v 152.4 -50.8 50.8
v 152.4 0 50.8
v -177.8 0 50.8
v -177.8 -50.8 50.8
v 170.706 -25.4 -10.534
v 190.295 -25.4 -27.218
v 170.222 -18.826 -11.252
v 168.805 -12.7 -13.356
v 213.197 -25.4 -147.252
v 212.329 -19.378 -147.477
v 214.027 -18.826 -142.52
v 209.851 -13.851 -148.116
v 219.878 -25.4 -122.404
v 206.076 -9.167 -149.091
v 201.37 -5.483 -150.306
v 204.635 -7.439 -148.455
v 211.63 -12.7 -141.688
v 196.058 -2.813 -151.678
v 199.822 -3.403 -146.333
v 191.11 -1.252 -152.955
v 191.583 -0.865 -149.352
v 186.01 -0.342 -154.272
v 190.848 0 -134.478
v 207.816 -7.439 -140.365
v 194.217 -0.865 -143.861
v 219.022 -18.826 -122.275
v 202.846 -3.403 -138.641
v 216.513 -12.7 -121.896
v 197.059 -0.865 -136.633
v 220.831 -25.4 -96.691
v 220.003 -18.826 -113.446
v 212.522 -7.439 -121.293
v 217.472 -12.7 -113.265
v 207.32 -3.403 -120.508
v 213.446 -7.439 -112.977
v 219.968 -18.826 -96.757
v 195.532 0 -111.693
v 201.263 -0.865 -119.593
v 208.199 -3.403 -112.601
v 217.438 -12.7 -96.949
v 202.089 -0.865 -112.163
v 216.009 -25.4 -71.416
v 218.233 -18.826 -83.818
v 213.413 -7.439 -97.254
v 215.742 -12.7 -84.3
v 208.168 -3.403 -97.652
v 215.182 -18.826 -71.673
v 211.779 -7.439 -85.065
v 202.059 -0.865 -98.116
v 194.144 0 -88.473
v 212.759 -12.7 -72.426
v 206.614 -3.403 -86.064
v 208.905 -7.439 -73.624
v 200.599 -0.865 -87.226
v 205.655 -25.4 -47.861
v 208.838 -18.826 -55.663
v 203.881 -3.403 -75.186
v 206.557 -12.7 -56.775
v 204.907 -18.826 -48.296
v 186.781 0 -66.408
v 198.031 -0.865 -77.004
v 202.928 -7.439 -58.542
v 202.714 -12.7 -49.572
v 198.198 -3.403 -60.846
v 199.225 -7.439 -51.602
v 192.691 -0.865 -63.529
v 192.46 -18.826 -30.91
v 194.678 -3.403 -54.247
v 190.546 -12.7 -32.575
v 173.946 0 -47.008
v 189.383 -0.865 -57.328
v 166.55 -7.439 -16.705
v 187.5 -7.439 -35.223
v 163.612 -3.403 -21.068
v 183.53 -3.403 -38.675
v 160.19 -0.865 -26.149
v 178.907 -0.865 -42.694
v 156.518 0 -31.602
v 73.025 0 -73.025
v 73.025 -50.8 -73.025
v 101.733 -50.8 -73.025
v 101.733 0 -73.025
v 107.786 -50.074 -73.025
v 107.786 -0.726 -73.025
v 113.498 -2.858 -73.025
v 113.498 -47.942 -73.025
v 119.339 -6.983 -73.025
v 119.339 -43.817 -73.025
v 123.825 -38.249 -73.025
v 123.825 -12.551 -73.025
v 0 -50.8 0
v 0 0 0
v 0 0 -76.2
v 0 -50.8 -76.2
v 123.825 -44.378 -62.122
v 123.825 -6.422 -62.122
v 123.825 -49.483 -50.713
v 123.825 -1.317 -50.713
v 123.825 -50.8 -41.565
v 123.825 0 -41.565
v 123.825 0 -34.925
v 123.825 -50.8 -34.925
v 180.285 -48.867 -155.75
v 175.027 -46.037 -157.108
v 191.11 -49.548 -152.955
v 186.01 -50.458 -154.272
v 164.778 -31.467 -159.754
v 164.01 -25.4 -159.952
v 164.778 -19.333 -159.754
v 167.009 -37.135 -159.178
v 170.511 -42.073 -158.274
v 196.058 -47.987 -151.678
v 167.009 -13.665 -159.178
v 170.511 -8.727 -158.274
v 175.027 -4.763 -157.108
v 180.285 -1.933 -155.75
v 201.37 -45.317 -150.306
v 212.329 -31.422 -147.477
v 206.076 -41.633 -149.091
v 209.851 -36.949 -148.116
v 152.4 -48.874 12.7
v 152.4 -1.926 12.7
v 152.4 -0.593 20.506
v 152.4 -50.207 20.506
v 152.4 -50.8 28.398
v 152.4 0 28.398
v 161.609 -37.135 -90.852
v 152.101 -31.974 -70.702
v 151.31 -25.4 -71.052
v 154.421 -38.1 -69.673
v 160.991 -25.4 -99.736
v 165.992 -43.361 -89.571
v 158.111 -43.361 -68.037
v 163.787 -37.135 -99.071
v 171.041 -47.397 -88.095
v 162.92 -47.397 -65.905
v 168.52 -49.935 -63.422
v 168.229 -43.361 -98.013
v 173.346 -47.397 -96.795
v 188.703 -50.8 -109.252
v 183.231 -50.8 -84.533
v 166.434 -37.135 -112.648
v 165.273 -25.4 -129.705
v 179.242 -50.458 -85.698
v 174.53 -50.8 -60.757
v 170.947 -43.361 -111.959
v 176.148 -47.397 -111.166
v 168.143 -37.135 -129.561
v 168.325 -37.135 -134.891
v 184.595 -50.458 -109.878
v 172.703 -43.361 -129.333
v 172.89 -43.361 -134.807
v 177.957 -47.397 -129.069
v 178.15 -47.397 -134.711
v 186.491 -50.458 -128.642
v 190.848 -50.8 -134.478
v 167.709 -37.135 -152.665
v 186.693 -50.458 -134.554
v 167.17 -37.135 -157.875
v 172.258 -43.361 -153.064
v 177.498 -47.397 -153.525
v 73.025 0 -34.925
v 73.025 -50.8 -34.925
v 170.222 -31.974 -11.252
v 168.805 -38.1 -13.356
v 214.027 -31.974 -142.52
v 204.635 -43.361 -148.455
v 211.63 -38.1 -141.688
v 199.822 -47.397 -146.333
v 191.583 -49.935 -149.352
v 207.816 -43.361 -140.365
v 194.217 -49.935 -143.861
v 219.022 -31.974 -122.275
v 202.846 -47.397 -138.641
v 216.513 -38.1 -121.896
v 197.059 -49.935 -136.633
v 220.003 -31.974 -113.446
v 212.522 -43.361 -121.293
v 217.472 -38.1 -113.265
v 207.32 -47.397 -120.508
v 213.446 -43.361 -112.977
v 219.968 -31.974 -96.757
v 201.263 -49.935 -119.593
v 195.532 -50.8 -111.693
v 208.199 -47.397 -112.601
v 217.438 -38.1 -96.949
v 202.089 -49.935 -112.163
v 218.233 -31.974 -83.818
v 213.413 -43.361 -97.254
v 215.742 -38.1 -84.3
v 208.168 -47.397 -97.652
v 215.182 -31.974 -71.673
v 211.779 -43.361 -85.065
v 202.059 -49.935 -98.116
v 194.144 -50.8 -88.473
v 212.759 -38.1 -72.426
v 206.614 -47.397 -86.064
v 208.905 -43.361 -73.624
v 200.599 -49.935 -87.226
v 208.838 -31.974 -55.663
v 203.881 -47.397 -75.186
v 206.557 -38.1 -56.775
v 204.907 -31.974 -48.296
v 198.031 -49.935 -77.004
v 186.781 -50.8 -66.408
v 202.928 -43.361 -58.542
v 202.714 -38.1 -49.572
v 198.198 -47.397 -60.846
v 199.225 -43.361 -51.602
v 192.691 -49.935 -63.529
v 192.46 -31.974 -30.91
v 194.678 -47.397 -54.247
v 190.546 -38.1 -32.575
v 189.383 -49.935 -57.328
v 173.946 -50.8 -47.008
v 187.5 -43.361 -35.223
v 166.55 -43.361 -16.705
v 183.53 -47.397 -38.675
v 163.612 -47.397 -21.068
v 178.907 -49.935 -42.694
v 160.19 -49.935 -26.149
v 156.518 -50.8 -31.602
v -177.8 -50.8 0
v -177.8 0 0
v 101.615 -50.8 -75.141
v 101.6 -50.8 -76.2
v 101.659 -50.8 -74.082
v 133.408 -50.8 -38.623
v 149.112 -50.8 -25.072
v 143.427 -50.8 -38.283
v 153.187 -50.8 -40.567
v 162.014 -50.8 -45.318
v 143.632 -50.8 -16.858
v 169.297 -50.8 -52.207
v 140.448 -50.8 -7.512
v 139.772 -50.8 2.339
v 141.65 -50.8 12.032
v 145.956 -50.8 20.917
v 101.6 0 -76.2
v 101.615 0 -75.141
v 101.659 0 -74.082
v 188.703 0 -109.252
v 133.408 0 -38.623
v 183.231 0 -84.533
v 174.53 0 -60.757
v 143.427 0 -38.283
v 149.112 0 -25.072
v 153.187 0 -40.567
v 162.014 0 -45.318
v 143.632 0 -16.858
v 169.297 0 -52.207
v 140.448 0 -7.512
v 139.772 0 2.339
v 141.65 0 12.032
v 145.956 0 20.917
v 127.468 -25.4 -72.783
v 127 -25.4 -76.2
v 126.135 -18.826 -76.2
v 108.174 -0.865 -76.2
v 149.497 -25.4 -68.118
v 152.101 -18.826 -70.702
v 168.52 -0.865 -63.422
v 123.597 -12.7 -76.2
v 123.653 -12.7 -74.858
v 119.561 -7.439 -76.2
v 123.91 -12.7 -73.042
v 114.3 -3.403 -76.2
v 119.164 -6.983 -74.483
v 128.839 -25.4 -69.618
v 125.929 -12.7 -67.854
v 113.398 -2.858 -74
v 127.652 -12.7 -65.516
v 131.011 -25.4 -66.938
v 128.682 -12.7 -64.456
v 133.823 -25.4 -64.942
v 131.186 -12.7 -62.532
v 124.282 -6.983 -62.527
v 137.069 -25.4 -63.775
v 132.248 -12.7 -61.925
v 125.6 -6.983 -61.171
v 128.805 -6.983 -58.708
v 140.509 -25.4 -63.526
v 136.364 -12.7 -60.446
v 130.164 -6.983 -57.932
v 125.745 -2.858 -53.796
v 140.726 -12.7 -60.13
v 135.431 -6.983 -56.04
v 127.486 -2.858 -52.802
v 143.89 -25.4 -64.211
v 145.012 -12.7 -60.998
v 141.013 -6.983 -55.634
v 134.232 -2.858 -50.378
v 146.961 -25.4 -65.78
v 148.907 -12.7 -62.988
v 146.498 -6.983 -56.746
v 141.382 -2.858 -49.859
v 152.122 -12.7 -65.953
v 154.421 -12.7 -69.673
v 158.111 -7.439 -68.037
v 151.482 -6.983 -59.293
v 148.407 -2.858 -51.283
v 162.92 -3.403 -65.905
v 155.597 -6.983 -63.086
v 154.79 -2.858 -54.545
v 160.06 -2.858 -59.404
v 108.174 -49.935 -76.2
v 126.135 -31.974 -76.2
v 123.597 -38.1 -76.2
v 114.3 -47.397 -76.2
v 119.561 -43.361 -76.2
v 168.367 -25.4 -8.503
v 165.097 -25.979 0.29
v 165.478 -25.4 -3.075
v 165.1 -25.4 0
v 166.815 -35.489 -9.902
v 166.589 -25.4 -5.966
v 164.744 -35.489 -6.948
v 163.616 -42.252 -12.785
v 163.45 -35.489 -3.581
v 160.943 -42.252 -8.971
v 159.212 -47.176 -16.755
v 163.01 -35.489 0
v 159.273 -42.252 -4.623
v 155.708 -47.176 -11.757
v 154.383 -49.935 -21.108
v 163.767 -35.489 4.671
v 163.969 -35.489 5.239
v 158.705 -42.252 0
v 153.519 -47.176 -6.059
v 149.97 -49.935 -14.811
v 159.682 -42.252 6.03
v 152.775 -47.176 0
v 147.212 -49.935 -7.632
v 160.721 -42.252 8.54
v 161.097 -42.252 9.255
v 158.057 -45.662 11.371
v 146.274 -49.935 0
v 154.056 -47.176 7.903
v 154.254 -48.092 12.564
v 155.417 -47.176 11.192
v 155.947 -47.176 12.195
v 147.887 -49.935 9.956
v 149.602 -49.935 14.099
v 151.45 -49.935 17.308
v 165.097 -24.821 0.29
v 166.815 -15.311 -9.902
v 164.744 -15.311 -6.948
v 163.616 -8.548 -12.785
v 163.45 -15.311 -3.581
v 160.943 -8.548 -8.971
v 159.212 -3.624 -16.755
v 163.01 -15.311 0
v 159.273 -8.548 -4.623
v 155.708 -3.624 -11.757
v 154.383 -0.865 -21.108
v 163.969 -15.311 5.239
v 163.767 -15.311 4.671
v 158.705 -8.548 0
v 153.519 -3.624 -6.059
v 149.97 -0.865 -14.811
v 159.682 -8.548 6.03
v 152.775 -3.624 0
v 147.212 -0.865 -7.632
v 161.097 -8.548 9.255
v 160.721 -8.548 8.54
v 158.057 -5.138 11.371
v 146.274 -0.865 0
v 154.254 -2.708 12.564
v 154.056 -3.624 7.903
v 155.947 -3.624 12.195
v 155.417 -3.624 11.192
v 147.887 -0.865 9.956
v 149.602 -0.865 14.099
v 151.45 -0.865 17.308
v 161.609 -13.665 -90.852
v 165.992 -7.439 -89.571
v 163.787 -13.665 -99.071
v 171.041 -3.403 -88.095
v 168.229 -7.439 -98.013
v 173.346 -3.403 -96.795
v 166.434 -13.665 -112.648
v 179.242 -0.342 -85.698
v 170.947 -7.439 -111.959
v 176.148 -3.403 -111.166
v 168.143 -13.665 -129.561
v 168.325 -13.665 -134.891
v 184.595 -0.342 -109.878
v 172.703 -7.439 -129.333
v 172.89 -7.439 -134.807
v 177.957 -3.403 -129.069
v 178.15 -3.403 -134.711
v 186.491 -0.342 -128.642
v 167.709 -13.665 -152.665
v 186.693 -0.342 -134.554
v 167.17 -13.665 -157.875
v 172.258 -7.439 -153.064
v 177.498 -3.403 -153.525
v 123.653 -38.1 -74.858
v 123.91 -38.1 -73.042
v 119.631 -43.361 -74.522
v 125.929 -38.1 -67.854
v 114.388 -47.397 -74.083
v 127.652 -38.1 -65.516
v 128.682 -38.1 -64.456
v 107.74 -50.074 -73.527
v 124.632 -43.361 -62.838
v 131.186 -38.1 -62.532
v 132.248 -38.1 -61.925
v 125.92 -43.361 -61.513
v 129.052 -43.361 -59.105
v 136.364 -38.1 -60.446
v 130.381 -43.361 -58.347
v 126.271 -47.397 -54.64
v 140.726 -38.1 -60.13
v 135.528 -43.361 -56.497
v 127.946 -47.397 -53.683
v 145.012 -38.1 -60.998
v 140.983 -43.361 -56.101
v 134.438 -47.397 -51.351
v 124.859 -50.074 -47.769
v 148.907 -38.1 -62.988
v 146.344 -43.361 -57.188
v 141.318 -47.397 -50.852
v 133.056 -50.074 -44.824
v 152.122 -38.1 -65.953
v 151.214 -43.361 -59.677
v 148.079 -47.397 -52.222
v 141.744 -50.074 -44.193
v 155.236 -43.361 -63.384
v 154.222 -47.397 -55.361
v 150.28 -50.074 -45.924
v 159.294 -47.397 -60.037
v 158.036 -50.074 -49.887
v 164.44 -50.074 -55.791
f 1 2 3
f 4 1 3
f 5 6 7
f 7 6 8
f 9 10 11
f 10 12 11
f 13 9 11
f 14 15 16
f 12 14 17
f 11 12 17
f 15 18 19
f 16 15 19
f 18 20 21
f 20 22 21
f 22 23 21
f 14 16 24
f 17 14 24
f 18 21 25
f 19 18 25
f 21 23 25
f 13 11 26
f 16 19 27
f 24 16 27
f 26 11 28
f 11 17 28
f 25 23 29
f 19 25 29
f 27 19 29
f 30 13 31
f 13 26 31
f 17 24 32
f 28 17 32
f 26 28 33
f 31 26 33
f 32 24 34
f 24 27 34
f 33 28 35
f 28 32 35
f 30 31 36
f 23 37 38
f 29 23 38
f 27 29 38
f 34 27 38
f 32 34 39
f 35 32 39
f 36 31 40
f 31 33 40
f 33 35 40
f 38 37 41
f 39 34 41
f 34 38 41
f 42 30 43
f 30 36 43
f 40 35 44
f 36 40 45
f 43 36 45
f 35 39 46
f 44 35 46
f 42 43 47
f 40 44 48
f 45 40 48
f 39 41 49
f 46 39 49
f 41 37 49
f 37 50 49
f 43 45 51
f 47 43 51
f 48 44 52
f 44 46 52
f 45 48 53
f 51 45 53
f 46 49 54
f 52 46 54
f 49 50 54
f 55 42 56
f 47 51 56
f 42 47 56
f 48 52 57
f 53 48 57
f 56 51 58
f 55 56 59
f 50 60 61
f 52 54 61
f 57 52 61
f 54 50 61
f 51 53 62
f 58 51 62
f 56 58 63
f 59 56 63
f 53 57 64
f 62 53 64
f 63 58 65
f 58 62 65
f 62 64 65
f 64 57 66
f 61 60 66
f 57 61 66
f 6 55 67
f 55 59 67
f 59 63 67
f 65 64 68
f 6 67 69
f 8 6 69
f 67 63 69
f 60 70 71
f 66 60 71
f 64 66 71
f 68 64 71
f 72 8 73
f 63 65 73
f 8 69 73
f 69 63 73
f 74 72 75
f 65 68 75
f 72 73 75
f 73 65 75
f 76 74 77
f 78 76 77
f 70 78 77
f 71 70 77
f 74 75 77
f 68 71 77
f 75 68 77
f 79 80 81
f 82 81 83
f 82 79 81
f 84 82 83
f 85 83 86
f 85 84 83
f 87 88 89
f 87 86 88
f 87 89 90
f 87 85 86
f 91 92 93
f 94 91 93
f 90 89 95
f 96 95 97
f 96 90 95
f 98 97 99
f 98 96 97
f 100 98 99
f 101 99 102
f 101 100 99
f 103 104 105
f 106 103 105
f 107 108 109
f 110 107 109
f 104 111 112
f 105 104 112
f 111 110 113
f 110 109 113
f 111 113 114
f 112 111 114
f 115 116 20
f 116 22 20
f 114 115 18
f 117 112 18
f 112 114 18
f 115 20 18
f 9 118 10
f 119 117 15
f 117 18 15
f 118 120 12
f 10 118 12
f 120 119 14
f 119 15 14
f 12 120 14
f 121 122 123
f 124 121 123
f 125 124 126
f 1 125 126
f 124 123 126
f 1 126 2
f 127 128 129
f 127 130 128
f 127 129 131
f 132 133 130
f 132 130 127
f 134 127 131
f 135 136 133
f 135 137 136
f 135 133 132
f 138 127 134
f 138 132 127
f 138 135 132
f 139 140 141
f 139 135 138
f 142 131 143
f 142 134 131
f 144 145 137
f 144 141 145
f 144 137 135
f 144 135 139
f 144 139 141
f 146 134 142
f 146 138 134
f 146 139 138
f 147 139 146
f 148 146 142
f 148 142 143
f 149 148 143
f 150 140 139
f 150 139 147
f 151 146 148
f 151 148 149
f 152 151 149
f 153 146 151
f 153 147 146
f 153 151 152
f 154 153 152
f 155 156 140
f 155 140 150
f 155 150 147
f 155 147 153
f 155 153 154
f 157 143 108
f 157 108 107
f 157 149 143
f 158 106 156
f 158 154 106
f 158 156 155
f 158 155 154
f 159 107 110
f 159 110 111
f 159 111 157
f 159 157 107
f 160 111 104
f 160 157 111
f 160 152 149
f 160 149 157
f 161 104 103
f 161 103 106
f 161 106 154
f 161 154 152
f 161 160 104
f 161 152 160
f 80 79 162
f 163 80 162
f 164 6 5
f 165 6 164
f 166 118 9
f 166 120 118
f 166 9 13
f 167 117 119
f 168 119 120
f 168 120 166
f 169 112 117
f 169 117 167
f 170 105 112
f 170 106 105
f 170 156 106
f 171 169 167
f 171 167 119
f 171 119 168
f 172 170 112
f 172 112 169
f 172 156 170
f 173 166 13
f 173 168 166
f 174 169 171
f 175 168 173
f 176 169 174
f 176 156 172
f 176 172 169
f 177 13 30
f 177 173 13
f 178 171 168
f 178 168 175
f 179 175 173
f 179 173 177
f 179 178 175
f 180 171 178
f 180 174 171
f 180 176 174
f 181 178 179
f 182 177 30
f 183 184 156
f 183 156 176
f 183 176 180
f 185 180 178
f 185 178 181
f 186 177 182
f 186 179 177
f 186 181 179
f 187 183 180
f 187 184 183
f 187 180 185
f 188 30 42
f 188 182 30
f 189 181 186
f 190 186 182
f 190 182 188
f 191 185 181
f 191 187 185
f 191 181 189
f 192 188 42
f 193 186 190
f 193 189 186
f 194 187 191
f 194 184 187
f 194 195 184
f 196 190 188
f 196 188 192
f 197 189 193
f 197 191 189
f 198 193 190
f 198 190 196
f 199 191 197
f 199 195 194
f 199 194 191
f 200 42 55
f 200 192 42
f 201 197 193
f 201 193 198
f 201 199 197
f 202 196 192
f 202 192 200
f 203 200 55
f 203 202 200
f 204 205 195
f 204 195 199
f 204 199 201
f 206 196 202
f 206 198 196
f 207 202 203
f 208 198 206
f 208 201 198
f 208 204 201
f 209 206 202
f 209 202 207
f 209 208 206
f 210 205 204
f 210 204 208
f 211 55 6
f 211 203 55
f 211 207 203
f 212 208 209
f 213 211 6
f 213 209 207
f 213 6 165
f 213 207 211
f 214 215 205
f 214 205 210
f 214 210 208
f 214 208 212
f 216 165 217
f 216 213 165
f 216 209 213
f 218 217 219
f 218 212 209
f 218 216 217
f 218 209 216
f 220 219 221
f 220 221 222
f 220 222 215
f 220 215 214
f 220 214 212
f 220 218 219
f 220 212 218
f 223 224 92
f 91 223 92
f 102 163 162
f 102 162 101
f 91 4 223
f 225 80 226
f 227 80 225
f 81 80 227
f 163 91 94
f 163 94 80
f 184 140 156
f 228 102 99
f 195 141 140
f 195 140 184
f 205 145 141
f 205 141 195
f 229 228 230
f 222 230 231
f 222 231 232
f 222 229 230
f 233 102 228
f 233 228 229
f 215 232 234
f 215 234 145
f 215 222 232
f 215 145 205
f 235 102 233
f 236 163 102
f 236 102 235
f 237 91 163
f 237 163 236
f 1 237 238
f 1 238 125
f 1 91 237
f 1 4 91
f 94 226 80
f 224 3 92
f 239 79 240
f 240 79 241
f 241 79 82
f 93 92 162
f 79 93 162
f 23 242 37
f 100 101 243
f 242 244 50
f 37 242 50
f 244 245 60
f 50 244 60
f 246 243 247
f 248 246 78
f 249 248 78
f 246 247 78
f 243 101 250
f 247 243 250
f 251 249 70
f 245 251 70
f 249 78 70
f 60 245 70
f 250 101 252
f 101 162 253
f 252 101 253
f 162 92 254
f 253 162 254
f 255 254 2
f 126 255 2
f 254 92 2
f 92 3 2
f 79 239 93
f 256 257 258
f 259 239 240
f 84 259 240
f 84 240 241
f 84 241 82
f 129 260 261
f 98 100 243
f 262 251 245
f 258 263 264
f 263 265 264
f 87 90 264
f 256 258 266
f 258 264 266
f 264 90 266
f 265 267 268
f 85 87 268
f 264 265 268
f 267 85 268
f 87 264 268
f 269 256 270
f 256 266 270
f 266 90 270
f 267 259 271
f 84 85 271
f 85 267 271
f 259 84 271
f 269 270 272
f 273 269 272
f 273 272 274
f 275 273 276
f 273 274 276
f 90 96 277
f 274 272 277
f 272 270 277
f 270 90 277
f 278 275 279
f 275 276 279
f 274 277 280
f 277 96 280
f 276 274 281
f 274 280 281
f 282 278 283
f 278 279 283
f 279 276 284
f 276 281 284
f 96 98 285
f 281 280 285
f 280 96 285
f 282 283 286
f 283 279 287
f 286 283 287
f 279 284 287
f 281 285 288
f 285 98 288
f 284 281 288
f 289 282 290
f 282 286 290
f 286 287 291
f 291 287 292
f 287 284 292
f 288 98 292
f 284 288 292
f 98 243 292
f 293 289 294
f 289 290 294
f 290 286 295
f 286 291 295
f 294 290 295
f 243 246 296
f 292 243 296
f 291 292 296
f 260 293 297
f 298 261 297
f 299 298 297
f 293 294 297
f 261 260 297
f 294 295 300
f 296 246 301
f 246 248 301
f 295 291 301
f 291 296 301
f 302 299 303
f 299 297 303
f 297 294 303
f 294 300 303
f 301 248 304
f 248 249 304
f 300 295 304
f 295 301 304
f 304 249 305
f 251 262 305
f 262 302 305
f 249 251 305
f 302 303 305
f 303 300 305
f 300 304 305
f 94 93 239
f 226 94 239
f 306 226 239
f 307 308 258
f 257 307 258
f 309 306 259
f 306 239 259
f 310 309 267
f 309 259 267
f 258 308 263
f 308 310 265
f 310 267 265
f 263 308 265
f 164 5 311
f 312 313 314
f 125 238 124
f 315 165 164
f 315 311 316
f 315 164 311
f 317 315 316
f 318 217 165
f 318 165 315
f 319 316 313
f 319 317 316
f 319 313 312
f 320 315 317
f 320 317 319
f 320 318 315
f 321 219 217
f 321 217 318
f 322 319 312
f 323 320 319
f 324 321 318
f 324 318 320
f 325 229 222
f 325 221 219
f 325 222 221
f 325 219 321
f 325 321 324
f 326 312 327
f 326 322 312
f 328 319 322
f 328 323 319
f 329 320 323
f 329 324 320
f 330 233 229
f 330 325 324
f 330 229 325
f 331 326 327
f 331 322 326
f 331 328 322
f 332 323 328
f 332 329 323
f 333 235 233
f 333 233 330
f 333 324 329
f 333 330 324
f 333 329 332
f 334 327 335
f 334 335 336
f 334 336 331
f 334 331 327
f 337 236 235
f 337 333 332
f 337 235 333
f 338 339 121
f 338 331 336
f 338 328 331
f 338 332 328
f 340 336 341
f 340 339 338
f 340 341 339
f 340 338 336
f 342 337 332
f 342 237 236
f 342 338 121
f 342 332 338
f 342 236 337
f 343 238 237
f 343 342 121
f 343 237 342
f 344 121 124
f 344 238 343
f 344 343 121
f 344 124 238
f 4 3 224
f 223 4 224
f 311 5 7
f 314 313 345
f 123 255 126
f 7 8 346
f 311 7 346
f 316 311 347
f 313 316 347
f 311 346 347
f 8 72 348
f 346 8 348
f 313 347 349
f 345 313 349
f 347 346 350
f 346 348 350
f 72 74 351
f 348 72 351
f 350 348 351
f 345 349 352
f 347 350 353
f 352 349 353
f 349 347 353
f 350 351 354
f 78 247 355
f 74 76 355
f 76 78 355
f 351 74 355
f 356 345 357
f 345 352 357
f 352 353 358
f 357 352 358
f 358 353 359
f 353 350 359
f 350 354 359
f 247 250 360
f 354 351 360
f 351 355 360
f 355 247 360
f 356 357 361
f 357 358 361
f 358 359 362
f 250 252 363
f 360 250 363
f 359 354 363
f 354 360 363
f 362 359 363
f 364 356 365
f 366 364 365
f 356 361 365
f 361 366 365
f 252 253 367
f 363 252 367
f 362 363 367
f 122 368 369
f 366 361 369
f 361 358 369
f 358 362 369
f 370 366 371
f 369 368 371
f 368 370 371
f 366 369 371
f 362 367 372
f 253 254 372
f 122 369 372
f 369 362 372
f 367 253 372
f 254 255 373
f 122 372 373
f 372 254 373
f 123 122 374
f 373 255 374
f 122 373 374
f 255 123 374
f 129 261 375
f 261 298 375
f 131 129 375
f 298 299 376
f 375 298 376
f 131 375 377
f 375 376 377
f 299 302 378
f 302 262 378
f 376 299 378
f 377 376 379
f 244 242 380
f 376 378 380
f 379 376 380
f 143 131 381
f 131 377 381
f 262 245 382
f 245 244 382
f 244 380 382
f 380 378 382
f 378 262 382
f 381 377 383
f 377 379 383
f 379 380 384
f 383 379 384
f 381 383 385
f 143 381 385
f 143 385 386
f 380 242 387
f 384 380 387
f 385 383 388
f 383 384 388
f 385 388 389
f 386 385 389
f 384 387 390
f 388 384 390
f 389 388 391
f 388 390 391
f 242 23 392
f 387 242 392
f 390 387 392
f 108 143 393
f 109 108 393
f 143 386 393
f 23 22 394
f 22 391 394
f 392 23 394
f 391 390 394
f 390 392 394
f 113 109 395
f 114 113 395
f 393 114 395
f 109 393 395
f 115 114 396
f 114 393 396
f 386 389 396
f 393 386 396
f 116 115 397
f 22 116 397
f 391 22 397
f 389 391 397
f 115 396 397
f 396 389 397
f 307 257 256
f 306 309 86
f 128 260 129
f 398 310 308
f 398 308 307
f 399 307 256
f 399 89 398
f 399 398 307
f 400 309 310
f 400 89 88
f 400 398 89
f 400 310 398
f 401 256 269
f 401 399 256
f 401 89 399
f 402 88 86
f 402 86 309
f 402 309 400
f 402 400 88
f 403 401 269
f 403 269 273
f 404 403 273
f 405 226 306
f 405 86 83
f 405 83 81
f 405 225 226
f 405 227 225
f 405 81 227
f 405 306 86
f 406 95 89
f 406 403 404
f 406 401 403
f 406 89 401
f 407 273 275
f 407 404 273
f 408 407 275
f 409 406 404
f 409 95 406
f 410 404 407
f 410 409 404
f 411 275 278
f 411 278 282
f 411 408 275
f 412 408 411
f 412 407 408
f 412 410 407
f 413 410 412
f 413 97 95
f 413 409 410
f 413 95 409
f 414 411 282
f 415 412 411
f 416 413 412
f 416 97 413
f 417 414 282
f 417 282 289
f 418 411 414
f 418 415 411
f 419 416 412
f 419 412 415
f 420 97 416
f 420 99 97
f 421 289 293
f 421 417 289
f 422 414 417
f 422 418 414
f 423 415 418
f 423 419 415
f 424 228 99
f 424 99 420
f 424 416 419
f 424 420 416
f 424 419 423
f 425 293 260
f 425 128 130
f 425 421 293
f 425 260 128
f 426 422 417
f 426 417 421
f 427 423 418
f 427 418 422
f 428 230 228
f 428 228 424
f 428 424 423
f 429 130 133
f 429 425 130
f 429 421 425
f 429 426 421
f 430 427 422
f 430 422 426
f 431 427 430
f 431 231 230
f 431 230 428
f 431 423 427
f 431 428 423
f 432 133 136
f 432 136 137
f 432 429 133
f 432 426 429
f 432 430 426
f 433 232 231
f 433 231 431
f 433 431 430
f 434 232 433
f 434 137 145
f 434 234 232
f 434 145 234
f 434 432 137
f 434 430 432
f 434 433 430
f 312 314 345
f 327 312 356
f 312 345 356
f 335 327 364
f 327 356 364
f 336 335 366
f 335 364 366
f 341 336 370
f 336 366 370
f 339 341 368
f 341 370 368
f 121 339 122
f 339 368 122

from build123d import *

# Parameters (mm, degrees)
F0_W         = 50.8
F0_H         = 38.1
F1_DEPTH     = 50.8
F2_T2_ANGLE  = 53.6002837339
F2_T4_ANGLE  = 53.6002837339
F2_T6_ANGLE  = 109.3939294159
F2_T8_ANGLE  = 109.3939294159
F2_T10_ANGLE = 342.5650608066
F2_T12_ANGLE = 342.5650608066
F2_T14_ANGLE = 359.64
F2_T16_ANGLE = 359.64


# Not quite as in the source:
# - a fillet or chamfer that OpenCascade refuses, or shapes differently, is made with other operations: its cross-section is extruded or revolved along the edge and cut away or added


with BuildPart() as f1:
    # F0 (on Front) → F1 (new body)
    with BuildSketch(Plane.XZ):
        with BuildLine():
            Line((-177.8, 0), (0, 0))
            Line((0, 0), (0, -76.2))
            Line((0, -76.2), (127, -76.2))
            ThreePointArc((127, -76.2), (137.069140052, -63.7754848813), (151.3100119581, -71.0524158741))
            ThreePointArc((151.3100119581, -71.0524158741), (163.8205179064, -114.6223435958), (164.0100119581, -159.9524158741))
            Line((164.0100119581, -159.9524158741), (213.1969004549, -147.2524158741))
            ThreePointArc((213.1969004549, -147.2524158741), (216.0088779453, -71.4162966266), (170.7058872965, -10.53392448))
            ThreePointArc((170.7058872965, -10.53392448), (166.5887281869, -5.9663543586), (165.1, 0))
            ThreePointArc((165.1, 0), (161.3802561211, 8.9802561211), (152.4, 12.7))
            Line((152.4, 12.7), (152.4, 50.8))
            Line((152.4, 50.8), (-177.8, 50.8))
            Line((-177.8, 50.8), (-177.8, 0))
        make_face()
        with Locations((98.425, -53.975)):
            Rectangle(F0_W, F0_H, mode=Mode.SUBTRACT)
    extrude(amount=F1_DEPTH)

    # F2: fillet of radius 25.4 on 8 edges, made by hand

    # F2_s1 → F2_t2 (revolve, cut)
    with BuildSketch(Plane(origin=(51.1854271814, 0, -115.4451111674), x_dir=(0, 1, 0), z_dir=(-0.4053215847, 0, 0.9141741699))):
        with BuildLine():
            ThreePointArc((-25.4, -109.5246267837), (-43.3605122421, -116.9641145416), (-50.8, -134.9246267837))
            Line((-50.8, -134.9246267837), (-50.8, -109.5246267837))
            Line((-50.8, -109.5246267837), (-25.4, -109.5246267837))
        make_face()
    revolve(axis=Axis((0.3798565029, -50.8, -137.9710095106), (0, 1, 0)), revolution_arc=F2_T2_ANGLE, mode=Mode.SUBTRACT)

    # F2_s3 → F2_t4 (revolve, cut)
    with BuildSketch(Plane(origin=(51.1854271814, 0, -115.4451111674), x_dir=(0, 1, 0), z_dir=(-0.4053215847, 0, 0.9141741699))):
        with BuildLine():
            ThreePointArc((-25.4, -109.5246267837), (-7.4394877579, -116.9641145416), (0, -134.9246267837))
            Line((0, -134.9246267837), (0, -109.5246267837))
            Line((0, -109.5246267837), (-25.4, -109.5246267837))
        make_face()
    revolve(axis=Axis((0.3798565029, 0, -137.9710095106), (0, 1, 0)), revolution_arc=F2_T4_ANGLE, mode=Mode.SUBTRACT)

    # F2_s5 → F2_t6 (revolve, cut)
    with BuildSketch(Plane(origin=(18.3403057366, 0, 13.6443784603), x_dir=(0, 1, 0), z_dir=(-0.802321654, 0, -0.5968919194))):
        with BuildLine():
            ThreePointArc((-25.4, 262.599154914), (-43.3605122421, 255.1596671561), (-50.8, 237.199154914))
            Line((-50.8, 237.199154914), (-50.8, 262.599154914))
            Line((-50.8, 262.599154914), (-25.4, 262.599154914))
        make_face()
    revolve(axis=Axis((106.8588729648, -50.8, -105.3392447997), (0, -1, 0)), revolution_arc=F2_T6_ANGLE, mode=Mode.SUBTRACT)

    # F2_s7 → F2_t8 (revolve, cut)
    with BuildSketch(Plane(origin=(18.3403057366, 0, 13.6443784603), x_dir=(0, 1, 0), z_dir=(-0.802321654, 0, -0.5968919194))):
        with BuildLine():
            ThreePointArc((-25.4, 262.599154914), (-7.4394877579, 255.1596671561), (0, 237.199154914))
            Line((0, 237.199154914), (0, 262.599154914))
            Line((0, 262.599154914), (-25.4, 262.599154914))
        make_face()
    revolve(axis=Axis((106.8588729648, 0, -105.3392447997), (0, -1, 0)), revolution_arc=F2_T8_ANGLE, mode=Mode.SUBTRACT)

    # F2_s9 → F2_t10 (revolve, cut)
    with BuildSketch(Plane(origin=(122.3220401021, 0, -82.378257055), x_dir=(0, 1, 0), z_dir=(0.8294428724, 0, -0.5585915515))):
        with BuildLine():
            ThreePointArc((-25.4, 86.6175778493), (-7.4394877579, 79.1780900914), (0, 61.2175778493))
            Line((0, 61.2175778493), (0, 86.6175778493))
            Line((0, 86.6175778493), (-25.4, 86.6175778493))
        make_face()
    revolve(axis=Axis((177.8, 0, 0), (0, 1, 0)), revolution_arc=F2_T10_ANGLE, mode=Mode.SUBTRACT)

    # F2_s11 → F2_t12 (revolve, cut)
    with BuildSketch(Plane(origin=(122.3220401021, 0, -82.378257055), x_dir=(0, 1, 0), z_dir=(0.8294428724, 0, -0.5585915515))):
        with BuildLine():
            ThreePointArc((-25.4, 86.6175778493), (-43.3605122421, 79.1780900914), (-50.8, 61.2175778493))
            Line((-50.8, 61.2175778493), (-50.8, 86.6175778493))
            Line((-50.8, 86.6175778493), (-25.4, 86.6175778493))
        make_face()
    revolve(axis=Axis((177.8, -50.8, 0), (0, 1, 0)), revolution_arc=F2_T12_ANGLE, mode=Mode.SUBTRACT)

    # F2_s13 → F2_t14 (revolve, cut)
    with BuildSketch(Plane(origin=(50.2149791059, 0, -115.2044645561), x_dir=(0, 1, 0), z_dir=(-0.3995696961, 0, 0.9167028188))):
        with BuildLine():
            ThreePointArc((-25.4, -110.3161729414), (-7.4394877579, -117.7556606993), (0, -135.7161729414))
            Line((0, -135.7161729414), (0, -110.3161729414))
            Line((0, -110.3161729414), (-25.4, -110.3161729414))
        make_face()
    revolve(axis=Axis((139.7, 0, -76.2), (0, 1, 0)), revolution_arc=F2_T14_ANGLE, mode=Mode.SUBTRACT)

    # F2_s15 → F2_t16 (revolve, cut)
    with BuildSketch(Plane(origin=(50.2149791059, 0, -115.2044645561), x_dir=(0, 1, 0), z_dir=(-0.3995696961, 0, 0.9167028188))):
        with BuildLine():
            ThreePointArc((-25.4, -110.3161729414), (-43.3605122421, -117.7556606993), (-50.8, -135.7161729414))
            Line((-50.8, -135.7161729414), (-50.8, -110.3161729414))
            Line((-50.8, -110.3161729414), (-25.4, -110.3161729414))
        make_face()
    revolve(axis=Axis((139.7, -50.8, -76.2), (0, 1, 0)), revolution_arc=F2_T16_ANGLE, mode=Mode.SUBTRACT)


solid = f1.part
